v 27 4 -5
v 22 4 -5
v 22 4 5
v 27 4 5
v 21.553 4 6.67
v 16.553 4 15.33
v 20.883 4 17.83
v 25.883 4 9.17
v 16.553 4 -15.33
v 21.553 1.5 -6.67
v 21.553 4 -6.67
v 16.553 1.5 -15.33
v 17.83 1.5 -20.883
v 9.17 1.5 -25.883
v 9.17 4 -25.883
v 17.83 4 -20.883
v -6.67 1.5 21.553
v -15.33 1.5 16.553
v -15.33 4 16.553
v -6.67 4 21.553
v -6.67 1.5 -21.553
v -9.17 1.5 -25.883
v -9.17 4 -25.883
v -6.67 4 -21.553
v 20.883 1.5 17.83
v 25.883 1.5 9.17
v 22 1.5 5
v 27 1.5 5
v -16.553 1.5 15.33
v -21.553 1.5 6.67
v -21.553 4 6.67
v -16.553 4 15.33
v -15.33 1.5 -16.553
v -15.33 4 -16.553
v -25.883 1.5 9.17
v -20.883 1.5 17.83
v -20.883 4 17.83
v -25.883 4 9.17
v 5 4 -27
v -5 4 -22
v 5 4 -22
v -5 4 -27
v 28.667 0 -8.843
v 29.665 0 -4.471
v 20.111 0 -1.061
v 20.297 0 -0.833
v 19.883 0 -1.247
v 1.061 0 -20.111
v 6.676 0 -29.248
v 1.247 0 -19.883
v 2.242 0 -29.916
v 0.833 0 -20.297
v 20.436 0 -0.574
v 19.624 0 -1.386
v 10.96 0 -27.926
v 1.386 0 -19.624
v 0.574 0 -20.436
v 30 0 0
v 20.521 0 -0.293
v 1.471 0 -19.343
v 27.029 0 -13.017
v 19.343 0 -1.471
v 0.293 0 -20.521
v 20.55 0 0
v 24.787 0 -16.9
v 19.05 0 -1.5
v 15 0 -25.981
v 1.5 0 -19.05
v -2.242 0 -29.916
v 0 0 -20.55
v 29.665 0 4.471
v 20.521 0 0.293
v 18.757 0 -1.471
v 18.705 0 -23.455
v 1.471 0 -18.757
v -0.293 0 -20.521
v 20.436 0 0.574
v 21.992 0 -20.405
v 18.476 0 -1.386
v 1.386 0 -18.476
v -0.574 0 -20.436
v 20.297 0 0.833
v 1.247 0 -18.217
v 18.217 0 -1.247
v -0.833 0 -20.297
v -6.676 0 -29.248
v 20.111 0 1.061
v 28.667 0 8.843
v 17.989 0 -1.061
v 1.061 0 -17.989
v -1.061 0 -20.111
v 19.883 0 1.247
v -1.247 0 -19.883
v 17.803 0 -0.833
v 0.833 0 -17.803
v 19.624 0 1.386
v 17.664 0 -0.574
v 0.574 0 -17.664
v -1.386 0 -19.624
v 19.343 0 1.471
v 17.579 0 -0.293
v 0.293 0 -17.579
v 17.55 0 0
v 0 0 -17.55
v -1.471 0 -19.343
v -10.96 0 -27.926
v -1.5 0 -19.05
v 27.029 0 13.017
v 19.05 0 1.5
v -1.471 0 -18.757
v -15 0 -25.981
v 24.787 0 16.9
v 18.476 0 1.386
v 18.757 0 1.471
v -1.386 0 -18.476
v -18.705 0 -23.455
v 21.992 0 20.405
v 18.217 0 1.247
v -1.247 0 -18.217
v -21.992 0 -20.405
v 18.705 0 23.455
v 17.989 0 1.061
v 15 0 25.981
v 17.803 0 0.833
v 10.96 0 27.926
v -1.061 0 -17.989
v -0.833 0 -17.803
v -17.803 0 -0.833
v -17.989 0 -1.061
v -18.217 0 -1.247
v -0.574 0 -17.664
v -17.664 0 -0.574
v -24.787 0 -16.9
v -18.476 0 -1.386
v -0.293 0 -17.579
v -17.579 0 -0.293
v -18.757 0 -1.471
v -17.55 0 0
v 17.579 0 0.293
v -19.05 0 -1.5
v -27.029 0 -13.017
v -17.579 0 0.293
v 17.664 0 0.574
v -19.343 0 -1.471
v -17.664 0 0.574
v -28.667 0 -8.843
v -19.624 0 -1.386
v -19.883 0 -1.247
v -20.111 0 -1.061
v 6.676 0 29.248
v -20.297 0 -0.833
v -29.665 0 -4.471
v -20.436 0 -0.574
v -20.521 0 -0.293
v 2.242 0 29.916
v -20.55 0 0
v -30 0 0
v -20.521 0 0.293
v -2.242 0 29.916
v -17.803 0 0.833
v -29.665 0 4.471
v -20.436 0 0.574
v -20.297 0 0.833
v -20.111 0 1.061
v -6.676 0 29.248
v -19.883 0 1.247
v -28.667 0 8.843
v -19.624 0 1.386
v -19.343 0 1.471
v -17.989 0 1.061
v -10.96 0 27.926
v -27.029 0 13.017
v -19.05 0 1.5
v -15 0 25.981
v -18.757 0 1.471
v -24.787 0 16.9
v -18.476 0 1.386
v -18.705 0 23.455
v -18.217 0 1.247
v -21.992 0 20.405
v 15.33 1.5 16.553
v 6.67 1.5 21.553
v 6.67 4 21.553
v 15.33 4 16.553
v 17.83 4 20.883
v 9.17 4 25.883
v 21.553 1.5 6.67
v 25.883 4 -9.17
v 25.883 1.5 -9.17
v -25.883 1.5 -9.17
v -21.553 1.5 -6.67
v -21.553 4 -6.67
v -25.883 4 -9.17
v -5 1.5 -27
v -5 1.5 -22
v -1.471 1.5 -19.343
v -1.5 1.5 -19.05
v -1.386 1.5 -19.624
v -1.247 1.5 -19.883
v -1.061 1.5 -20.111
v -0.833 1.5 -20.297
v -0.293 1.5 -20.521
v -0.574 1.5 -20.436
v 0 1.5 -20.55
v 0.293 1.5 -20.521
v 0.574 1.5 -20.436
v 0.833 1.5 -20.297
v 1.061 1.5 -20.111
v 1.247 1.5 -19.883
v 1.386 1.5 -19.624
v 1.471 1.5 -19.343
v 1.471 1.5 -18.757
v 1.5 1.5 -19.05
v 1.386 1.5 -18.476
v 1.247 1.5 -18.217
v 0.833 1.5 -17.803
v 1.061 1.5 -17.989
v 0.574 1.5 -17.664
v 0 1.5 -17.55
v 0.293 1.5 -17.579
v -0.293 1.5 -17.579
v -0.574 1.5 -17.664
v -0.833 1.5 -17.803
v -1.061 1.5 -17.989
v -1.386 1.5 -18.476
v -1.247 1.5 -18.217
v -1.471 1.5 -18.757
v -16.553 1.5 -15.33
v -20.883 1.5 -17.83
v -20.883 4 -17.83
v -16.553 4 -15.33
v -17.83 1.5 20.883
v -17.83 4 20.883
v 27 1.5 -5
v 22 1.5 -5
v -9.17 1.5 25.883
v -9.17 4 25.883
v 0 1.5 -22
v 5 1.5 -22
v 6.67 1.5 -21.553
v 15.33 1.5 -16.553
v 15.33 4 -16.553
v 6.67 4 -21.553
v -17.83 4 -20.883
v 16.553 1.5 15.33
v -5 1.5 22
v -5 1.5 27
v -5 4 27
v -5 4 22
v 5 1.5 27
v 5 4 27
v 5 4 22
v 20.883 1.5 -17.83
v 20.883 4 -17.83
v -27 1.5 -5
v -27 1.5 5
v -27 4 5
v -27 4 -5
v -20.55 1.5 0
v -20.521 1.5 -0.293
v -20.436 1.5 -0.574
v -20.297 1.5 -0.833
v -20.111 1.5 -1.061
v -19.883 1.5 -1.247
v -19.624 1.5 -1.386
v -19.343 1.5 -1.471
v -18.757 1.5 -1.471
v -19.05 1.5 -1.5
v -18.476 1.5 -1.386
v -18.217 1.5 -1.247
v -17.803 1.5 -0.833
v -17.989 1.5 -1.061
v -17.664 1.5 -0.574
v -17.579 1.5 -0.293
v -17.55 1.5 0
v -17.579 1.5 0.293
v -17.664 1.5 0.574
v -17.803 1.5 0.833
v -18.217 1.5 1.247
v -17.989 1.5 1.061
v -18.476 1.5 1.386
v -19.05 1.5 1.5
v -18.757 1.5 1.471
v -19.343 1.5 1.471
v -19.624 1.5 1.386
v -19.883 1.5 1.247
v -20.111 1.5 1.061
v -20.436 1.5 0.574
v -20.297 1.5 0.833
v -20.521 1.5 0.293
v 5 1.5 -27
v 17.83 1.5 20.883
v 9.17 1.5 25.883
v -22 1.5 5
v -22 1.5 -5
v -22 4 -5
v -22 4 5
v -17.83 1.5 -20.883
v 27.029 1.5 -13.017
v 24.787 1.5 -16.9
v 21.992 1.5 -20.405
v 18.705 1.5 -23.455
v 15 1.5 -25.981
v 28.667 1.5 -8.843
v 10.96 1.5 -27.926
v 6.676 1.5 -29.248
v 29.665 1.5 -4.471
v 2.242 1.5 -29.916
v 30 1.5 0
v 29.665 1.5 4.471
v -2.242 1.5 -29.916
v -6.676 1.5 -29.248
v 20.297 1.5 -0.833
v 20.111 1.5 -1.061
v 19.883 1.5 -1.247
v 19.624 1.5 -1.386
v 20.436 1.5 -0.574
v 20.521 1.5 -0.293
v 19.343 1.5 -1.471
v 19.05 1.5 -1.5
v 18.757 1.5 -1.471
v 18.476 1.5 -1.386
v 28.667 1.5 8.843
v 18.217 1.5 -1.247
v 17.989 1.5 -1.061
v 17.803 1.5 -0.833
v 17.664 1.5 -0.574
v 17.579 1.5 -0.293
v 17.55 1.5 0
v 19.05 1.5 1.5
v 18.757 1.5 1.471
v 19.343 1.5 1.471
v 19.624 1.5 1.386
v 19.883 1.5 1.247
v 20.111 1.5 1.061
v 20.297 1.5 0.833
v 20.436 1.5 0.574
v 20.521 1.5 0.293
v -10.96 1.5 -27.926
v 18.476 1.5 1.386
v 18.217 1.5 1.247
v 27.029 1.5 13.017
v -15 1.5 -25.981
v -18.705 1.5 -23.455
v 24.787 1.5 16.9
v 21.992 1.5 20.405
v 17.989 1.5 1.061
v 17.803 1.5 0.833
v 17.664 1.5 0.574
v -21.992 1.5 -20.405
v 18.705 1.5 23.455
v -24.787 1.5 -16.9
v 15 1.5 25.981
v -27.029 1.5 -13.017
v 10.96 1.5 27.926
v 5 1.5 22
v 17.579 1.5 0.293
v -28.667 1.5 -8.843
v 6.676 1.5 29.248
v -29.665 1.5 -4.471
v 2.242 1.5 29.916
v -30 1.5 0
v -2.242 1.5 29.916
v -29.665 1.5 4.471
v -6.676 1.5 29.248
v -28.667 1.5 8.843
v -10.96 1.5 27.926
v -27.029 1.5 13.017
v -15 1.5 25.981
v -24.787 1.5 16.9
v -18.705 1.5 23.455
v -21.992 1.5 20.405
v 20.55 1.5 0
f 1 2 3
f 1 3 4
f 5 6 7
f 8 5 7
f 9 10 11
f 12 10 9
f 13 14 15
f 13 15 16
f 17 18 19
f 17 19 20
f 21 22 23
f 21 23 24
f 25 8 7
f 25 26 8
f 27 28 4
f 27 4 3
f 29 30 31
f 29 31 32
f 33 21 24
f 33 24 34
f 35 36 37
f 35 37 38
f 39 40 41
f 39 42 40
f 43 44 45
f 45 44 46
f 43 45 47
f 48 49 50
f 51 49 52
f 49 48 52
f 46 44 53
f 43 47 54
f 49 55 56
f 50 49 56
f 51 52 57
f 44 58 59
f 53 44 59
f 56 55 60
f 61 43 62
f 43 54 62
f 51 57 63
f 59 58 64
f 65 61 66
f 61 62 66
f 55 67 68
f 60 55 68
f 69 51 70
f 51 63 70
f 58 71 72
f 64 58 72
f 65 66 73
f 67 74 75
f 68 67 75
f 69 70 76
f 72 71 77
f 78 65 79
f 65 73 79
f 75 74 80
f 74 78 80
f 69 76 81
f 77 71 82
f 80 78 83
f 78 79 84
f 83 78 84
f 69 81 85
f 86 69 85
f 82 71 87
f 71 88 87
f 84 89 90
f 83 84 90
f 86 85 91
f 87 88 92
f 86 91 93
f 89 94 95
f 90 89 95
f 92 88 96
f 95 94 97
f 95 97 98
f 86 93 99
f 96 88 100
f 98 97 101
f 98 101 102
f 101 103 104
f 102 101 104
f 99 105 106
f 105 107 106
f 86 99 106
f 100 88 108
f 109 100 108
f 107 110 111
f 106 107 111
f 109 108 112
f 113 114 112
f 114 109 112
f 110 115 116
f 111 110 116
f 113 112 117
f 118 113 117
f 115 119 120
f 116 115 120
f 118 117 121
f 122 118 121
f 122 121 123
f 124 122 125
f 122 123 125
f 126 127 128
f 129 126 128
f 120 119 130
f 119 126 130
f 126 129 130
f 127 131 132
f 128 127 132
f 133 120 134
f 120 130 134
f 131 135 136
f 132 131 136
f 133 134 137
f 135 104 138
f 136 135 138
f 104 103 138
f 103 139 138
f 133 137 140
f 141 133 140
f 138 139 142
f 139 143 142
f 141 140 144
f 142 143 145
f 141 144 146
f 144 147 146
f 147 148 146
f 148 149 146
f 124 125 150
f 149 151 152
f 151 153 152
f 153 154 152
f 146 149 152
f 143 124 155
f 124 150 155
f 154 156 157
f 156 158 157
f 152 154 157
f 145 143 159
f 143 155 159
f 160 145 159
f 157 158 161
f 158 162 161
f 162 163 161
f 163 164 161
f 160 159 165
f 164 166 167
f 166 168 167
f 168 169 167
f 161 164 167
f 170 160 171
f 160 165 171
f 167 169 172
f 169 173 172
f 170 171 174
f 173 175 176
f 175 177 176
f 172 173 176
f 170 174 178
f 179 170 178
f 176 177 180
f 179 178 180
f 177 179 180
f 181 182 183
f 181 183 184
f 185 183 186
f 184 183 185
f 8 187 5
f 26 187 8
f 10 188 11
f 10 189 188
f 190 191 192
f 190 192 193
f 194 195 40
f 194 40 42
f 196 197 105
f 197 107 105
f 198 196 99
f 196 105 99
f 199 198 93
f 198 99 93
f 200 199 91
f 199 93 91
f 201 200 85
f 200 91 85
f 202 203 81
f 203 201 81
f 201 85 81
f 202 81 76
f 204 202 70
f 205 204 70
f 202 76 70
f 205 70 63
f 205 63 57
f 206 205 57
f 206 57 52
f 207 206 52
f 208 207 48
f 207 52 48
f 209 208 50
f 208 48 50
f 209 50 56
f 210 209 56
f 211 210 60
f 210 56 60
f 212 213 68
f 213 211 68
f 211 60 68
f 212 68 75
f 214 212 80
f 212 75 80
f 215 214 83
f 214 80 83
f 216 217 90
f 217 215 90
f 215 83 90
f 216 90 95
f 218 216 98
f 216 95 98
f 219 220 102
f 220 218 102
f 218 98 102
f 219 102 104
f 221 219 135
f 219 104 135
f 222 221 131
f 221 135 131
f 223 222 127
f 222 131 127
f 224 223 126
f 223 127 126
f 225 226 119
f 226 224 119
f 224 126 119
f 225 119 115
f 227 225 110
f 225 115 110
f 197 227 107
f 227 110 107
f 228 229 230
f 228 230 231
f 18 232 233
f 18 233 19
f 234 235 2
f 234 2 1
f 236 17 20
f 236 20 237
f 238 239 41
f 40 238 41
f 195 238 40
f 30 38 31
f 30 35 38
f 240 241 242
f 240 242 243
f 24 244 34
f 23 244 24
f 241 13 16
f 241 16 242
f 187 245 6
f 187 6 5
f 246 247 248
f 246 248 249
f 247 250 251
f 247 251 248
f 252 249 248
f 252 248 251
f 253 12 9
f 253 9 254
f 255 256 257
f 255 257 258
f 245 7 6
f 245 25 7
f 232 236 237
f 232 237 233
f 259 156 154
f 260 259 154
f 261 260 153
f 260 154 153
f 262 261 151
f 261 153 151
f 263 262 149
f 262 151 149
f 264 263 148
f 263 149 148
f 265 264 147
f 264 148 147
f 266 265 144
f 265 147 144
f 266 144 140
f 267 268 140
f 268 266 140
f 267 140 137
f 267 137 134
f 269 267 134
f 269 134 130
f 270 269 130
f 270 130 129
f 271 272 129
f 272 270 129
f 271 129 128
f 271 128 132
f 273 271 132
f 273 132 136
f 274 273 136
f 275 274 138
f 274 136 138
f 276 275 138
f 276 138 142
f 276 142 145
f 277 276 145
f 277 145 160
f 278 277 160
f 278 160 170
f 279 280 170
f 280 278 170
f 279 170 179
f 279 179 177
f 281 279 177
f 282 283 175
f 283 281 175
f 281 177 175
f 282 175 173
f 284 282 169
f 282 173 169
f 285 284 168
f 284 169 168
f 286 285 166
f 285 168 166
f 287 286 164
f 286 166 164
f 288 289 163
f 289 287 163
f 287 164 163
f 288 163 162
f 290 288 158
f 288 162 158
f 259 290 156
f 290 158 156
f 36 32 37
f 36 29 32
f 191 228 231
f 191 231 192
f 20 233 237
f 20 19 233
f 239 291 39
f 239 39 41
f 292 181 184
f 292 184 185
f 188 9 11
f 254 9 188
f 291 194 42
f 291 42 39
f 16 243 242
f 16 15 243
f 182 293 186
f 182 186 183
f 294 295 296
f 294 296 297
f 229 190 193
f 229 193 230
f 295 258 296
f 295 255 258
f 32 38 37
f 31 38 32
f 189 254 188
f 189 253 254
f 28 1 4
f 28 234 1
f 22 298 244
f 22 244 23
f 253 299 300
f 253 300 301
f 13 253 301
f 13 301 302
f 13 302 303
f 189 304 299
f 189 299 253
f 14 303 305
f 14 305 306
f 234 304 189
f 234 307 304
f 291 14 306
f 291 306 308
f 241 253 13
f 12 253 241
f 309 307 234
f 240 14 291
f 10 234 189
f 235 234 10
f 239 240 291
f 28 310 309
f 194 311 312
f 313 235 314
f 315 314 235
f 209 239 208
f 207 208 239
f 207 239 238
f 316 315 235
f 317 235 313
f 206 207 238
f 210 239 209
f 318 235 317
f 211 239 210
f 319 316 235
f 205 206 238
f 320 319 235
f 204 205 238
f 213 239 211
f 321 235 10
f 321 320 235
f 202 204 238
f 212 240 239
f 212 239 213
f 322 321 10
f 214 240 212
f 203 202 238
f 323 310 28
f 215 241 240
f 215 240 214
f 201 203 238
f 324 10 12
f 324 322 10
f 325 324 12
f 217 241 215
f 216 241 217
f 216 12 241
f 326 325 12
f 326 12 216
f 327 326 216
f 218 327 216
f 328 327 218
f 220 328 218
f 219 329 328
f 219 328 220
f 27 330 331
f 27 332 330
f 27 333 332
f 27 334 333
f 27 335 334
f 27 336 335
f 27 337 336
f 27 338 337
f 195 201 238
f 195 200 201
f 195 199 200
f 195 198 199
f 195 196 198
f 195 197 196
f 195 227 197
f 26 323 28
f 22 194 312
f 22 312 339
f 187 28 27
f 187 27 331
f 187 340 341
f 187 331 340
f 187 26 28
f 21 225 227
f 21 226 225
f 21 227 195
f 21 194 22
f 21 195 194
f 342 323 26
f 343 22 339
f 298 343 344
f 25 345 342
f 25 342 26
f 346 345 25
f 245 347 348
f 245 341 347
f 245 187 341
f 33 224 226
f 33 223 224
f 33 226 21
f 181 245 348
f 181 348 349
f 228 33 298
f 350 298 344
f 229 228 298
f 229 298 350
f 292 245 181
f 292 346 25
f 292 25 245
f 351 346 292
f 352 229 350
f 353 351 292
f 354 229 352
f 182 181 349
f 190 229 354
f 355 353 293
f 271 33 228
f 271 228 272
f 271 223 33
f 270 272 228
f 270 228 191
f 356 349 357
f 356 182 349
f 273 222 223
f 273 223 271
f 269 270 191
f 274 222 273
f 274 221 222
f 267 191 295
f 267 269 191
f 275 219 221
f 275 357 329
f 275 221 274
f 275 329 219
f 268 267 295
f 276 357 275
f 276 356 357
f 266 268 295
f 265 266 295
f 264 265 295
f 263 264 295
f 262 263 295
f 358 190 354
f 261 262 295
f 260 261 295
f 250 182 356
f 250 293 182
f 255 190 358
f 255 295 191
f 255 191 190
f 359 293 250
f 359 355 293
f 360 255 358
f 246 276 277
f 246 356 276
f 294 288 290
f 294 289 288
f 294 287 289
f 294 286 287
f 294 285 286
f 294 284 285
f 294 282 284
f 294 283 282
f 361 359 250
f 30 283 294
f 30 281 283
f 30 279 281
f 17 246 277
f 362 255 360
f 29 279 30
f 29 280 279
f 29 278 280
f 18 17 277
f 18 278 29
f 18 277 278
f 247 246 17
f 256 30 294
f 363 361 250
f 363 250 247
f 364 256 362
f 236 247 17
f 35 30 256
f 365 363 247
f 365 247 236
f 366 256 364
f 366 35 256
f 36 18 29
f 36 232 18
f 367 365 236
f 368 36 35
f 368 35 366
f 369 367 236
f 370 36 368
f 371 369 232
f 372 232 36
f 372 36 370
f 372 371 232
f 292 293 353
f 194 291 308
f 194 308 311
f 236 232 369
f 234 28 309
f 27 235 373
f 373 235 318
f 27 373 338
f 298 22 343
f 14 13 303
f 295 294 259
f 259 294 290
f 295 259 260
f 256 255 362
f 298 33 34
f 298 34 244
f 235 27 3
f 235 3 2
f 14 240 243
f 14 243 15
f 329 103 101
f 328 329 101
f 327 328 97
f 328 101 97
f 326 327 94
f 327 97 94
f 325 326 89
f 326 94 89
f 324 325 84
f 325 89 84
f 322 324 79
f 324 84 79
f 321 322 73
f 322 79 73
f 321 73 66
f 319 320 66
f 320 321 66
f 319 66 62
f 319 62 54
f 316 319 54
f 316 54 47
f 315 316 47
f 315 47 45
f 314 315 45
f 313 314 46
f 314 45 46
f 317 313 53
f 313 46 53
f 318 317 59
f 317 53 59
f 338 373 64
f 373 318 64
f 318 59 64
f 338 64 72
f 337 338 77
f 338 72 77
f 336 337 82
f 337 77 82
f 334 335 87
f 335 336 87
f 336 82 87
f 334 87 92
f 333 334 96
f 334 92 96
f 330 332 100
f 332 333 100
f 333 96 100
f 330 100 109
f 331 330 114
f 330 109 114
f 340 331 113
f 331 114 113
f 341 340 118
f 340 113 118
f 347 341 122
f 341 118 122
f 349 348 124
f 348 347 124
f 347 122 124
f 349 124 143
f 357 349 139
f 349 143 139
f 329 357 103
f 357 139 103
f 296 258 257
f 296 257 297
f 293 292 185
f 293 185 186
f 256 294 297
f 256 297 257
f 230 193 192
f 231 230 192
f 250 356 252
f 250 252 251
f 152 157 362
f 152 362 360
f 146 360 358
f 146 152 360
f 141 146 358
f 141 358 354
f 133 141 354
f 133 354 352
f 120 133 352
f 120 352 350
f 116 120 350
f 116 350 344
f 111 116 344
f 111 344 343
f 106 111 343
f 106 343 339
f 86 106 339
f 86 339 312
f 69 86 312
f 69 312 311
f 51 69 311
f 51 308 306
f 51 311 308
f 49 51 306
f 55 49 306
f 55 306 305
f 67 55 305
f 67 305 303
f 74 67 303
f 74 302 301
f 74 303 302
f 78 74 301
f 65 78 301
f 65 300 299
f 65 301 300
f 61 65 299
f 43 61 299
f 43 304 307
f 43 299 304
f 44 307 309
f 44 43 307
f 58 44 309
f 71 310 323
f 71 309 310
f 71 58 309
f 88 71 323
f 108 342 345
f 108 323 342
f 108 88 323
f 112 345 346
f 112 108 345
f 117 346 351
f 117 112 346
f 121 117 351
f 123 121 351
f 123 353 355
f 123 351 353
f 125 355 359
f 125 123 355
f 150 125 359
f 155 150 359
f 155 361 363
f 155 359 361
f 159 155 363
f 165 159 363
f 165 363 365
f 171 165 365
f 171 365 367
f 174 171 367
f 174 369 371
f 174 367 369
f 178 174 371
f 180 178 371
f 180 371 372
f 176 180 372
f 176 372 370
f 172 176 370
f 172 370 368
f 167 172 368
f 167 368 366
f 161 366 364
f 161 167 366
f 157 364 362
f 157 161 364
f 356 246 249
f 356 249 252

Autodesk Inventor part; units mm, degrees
ref_plane "YZ Plane" through (0, 0, 0) normal (1, 0, 0) x (0, 1, 0)
ref_plane "XZ Plane" through (0, 0, 0) normal (0, 1, 0) x (-1, 0, 0)
ref_plane "XY Plane" through (0, 0, 0) normal (0, 0, 1) x (1, 0, 0)
sketch "Sketch1" plane through (0, 0, 0) normal (0, 1, 0) x (-1, 0, 0)
  line L0 (0, 0) -> (19.05, 0)
  line L1 (0, 0) -> (-19.05, 0)
  line L2 (0, 0) -> (0, -19.05)
  circle A0 centre (-19.05, 0) radius 1.5
  circle A1 centre (19.05, 0) radius 1.5
  circle A2 centre (0, -19.05) radius 1.5
  line L3 (0, -20.55) -> (0, -22.55)
  line L4 (0, -22.55) -> (5, -22.55)
  line L5 (5, -22.55) -> (5, -27.55)
  line L6 (5, -27.55) -> (-5, -27.55)
  line L7 (-5, -27.55) -> (-5, -22.55)
  line L8 (-5, -22.55) -> (0, -22.55)
  circle A3 centre (0, 0) radius 30
  dimension "d6" = 3
  dimension "d0" = 19.05
  dimension "d1" = 19.05
  dimension "d2" = 19.05
  dimension "d4" = 3
  dimension "d5" = 3
  dimension "d7" = 2
  dimension "d8" = 5
  dimension "d9" = 5
  dimension "d10" = 10
  dimension "d11" = 60
extrude "Extrusion1" add sketch "Sketch1" along normal blind 1.5 contours L4 L5 L6 L7 L8 | A3
sketch "Sketch2" plane through (0, 1.5, 0) normal (0, 1, 0) x (1, 0, 0)
  line L0 (0, 0) -> (0, 22)
  line L1 (0, 22) -> (-5, 22)
  line L2 (-5, 22) -> (-5, 27)
  line L3 (-5, 27) -> (0, 27)
  line L4 (0, 27) -> (5, 27)
  line L5 (5, 27) -> (5, 22)
  line L6 (5, 22) -> (0, 22)
  line L7 (-11, 19.0526) -> (-15.3301, 16.5526)
  line L8 (-15.3301, 16.5526) -> (-17.8301, 20.8827)
  line L9 (-17.8301, 20.8827) -> (-13.5, 23.3827)
  line L10 (-13.5, 23.3827) -> (-9.1699, 25.8827)
  line L11 (-9.1699, 25.8827) -> (-6.6699, 21.5526)
  line L12 (-6.6699, 21.5526) -> (-11, 19.0526)
  line L13 (-19.0526, 11) -> (-21.5526, 6.6699)
  line L14 (-21.5526, 6.6699) -> (-25.8827, 9.1699)
  line L15 (-25.8827, 9.1699) -> (-23.3827, 13.5)
  line L16 (-23.3827, 13.5) -> (-20.8827, 17.8301)
  line L17 (-20.8827, 17.8301) -> (-16.5526, 15.3301)
  line L18 (-16.5526, 15.3301) -> (-19.0526, 11)
  line L19 (-22, 0) -> (-22, -5)
  line L20 (-22, -5) -> (-27, -5)
  line L21 (-27, -5) -> (-27, 0)
  line L22 (-27, 0) -> (-27, 5)
  line L23 (-27, 5) -> (-22, 5)
  line L24 (-22, 5) -> (-22, 0)
  line L25 (-19.0526, -11) -> (-16.5526, -15.3301)
  line L26 (-16.5526, -15.3301) -> (-20.8827, -17.8301)
  line L27 (-20.8827, -17.8301) -> (-23.3827, -13.5)
  line L28 (-23.3827, -13.5) -> (-25.8827, -9.1699)
  line L29 (-25.8827, -9.1699) -> (-21.5526, -6.6699)
  line L30 (-21.5526, -6.6699) -> (-19.0526, -11)
  line L31 (-11, -19.0526) -> (-6.6699, -21.5526)
  line L32 (-6.6699, -21.5526) -> (-9.1699, -25.8827)
  line L33 (-9.1699, -25.8827) -> (-13.5, -23.3827)
  line L34 (-13.5, -23.3827) -> (-17.8301, -20.8827)
  line L35 (-17.8301, -20.8827) -> (-15.3301, -16.5526)
  line L36 (-15.3301, -16.5526) -> (-11, -19.0526)
  line L37 (0, -22) -> (5, -22)
  line L38 (5, -22) -> (5, -27)
  line L39 (5, -27) -> (0, -27)
  line L40 (0, -27) -> (-5, -27)
  line L41 (-5, -27) -> (-5, -22)
  line L42 (-5, -22) -> (0, -22)
  line L43 (11, -19.0526) -> (15.3301, -16.5526)
  line L44 (15.3301, -16.5526) -> (17.8301, -20.8827)
  line L45 (17.8301, -20.8827) -> (13.5, -23.3827)
  line L46 (13.5, -23.3827) -> (9.1699, -25.8827)
  line L47 (9.1699, -25.8827) -> (6.6699, -21.5526)
  line L48 (6.6699, -21.5526) -> (11, -19.0526)
  line L49 (19.0526, -11) -> (21.5526, -6.6699)
  line L50 (21.5526, -6.6699) -> (25.8827, -9.1699)
  line L51 (25.8827, -9.1699) -> (23.3827, -13.5)
  line L52 (23.3827, -13.5) -> (20.8827, -17.8301)
  line L53 (20.8827, -17.8301) -> (16.5526, -15.3301)
  line L54 (16.5526, -15.3301) -> (19.0526, -11)
  line L55 (22, 0) -> (22, 5)
  line L56 (22, 5) -> (27, 5)
  line L57 (27, 5) -> (27, 0)
  line L58 (27, 0) -> (27, -5)
  line L59 (27, -5) -> (22, -5)
  line L60 (22, -5) -> (22, 0)
  line L61 (19.0526, 11) -> (16.5526, 15.3301)
  line L62 (16.5526, 15.3301) -> (20.8827, 17.8301)
  line L63 (20.8827, 17.8301) -> (23.3827, 13.5)
  line L64 (23.3827, 13.5) -> (25.8827, 9.1699)
  line L65 (25.8827, 9.1699) -> (21.5526, 6.6699)
  line L66 (21.5526, 6.6699) -> (19.0526, 11)
  line L67 (11, 19.0526) -> (6.6699, 21.5526)
  line L68 (6.6699, 21.5526) -> (9.1699, 25.8827)
  line L69 (9.1699, 25.8827) -> (13.5, 23.3827)
  line L70 (13.5, 23.3827) -> (17.8301, 20.8827)
  line L71 (17.8301, 20.8827) -> (15.3301, 16.5526)
  line L72 (15.3301, 16.5526) -> (11, 19.0526)
  dimension "d14" = 22
  dimension "d15" = 5
  dimension "d16" = 5
  dimension "d17" = 5
  dimension "d18" = 5
  dimension "d21" = 360
extrude "Extrusion2" add sketch "Sketch2" along normal blind 2.5
properties part number "TSSP Receiver"
